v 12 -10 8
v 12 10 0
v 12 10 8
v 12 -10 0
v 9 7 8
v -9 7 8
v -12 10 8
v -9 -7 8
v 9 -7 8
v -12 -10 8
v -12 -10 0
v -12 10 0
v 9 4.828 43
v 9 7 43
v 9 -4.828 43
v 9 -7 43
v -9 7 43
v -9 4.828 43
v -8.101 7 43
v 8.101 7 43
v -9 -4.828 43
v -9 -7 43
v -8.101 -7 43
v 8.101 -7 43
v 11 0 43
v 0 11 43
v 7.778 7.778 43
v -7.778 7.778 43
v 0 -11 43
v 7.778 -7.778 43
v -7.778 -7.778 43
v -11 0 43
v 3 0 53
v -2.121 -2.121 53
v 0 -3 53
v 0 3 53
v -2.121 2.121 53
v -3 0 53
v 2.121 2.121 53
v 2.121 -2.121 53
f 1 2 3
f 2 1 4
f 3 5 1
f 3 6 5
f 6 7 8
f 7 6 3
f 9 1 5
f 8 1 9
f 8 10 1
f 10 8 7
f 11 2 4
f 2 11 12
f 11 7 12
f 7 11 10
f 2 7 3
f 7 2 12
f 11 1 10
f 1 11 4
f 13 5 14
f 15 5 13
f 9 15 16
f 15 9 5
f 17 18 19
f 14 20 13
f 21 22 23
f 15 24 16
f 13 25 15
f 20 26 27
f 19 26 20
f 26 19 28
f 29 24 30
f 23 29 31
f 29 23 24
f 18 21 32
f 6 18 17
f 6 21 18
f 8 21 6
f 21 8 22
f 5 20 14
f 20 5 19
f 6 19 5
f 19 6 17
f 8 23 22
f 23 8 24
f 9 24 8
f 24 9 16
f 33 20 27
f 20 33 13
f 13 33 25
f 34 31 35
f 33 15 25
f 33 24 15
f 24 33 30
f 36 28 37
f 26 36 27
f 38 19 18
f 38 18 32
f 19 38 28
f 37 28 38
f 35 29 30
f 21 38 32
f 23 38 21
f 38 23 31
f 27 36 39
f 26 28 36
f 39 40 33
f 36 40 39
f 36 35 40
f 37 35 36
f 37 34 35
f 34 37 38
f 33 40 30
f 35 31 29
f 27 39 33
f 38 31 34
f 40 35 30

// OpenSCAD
// Placeholder: low polygon count for the original DOS renderer.
// Z is up. The converter uniformly fits this mesh into its selected city slot.
$fn = 8;
union() {
    translate([-12,-10,0]) cube([24,20,8]);
    translate([-9,-7,8]) cube([18,14,35]);
    translate([0,0,43]) cylinder(h=10,r1=11,r2=3);
}
